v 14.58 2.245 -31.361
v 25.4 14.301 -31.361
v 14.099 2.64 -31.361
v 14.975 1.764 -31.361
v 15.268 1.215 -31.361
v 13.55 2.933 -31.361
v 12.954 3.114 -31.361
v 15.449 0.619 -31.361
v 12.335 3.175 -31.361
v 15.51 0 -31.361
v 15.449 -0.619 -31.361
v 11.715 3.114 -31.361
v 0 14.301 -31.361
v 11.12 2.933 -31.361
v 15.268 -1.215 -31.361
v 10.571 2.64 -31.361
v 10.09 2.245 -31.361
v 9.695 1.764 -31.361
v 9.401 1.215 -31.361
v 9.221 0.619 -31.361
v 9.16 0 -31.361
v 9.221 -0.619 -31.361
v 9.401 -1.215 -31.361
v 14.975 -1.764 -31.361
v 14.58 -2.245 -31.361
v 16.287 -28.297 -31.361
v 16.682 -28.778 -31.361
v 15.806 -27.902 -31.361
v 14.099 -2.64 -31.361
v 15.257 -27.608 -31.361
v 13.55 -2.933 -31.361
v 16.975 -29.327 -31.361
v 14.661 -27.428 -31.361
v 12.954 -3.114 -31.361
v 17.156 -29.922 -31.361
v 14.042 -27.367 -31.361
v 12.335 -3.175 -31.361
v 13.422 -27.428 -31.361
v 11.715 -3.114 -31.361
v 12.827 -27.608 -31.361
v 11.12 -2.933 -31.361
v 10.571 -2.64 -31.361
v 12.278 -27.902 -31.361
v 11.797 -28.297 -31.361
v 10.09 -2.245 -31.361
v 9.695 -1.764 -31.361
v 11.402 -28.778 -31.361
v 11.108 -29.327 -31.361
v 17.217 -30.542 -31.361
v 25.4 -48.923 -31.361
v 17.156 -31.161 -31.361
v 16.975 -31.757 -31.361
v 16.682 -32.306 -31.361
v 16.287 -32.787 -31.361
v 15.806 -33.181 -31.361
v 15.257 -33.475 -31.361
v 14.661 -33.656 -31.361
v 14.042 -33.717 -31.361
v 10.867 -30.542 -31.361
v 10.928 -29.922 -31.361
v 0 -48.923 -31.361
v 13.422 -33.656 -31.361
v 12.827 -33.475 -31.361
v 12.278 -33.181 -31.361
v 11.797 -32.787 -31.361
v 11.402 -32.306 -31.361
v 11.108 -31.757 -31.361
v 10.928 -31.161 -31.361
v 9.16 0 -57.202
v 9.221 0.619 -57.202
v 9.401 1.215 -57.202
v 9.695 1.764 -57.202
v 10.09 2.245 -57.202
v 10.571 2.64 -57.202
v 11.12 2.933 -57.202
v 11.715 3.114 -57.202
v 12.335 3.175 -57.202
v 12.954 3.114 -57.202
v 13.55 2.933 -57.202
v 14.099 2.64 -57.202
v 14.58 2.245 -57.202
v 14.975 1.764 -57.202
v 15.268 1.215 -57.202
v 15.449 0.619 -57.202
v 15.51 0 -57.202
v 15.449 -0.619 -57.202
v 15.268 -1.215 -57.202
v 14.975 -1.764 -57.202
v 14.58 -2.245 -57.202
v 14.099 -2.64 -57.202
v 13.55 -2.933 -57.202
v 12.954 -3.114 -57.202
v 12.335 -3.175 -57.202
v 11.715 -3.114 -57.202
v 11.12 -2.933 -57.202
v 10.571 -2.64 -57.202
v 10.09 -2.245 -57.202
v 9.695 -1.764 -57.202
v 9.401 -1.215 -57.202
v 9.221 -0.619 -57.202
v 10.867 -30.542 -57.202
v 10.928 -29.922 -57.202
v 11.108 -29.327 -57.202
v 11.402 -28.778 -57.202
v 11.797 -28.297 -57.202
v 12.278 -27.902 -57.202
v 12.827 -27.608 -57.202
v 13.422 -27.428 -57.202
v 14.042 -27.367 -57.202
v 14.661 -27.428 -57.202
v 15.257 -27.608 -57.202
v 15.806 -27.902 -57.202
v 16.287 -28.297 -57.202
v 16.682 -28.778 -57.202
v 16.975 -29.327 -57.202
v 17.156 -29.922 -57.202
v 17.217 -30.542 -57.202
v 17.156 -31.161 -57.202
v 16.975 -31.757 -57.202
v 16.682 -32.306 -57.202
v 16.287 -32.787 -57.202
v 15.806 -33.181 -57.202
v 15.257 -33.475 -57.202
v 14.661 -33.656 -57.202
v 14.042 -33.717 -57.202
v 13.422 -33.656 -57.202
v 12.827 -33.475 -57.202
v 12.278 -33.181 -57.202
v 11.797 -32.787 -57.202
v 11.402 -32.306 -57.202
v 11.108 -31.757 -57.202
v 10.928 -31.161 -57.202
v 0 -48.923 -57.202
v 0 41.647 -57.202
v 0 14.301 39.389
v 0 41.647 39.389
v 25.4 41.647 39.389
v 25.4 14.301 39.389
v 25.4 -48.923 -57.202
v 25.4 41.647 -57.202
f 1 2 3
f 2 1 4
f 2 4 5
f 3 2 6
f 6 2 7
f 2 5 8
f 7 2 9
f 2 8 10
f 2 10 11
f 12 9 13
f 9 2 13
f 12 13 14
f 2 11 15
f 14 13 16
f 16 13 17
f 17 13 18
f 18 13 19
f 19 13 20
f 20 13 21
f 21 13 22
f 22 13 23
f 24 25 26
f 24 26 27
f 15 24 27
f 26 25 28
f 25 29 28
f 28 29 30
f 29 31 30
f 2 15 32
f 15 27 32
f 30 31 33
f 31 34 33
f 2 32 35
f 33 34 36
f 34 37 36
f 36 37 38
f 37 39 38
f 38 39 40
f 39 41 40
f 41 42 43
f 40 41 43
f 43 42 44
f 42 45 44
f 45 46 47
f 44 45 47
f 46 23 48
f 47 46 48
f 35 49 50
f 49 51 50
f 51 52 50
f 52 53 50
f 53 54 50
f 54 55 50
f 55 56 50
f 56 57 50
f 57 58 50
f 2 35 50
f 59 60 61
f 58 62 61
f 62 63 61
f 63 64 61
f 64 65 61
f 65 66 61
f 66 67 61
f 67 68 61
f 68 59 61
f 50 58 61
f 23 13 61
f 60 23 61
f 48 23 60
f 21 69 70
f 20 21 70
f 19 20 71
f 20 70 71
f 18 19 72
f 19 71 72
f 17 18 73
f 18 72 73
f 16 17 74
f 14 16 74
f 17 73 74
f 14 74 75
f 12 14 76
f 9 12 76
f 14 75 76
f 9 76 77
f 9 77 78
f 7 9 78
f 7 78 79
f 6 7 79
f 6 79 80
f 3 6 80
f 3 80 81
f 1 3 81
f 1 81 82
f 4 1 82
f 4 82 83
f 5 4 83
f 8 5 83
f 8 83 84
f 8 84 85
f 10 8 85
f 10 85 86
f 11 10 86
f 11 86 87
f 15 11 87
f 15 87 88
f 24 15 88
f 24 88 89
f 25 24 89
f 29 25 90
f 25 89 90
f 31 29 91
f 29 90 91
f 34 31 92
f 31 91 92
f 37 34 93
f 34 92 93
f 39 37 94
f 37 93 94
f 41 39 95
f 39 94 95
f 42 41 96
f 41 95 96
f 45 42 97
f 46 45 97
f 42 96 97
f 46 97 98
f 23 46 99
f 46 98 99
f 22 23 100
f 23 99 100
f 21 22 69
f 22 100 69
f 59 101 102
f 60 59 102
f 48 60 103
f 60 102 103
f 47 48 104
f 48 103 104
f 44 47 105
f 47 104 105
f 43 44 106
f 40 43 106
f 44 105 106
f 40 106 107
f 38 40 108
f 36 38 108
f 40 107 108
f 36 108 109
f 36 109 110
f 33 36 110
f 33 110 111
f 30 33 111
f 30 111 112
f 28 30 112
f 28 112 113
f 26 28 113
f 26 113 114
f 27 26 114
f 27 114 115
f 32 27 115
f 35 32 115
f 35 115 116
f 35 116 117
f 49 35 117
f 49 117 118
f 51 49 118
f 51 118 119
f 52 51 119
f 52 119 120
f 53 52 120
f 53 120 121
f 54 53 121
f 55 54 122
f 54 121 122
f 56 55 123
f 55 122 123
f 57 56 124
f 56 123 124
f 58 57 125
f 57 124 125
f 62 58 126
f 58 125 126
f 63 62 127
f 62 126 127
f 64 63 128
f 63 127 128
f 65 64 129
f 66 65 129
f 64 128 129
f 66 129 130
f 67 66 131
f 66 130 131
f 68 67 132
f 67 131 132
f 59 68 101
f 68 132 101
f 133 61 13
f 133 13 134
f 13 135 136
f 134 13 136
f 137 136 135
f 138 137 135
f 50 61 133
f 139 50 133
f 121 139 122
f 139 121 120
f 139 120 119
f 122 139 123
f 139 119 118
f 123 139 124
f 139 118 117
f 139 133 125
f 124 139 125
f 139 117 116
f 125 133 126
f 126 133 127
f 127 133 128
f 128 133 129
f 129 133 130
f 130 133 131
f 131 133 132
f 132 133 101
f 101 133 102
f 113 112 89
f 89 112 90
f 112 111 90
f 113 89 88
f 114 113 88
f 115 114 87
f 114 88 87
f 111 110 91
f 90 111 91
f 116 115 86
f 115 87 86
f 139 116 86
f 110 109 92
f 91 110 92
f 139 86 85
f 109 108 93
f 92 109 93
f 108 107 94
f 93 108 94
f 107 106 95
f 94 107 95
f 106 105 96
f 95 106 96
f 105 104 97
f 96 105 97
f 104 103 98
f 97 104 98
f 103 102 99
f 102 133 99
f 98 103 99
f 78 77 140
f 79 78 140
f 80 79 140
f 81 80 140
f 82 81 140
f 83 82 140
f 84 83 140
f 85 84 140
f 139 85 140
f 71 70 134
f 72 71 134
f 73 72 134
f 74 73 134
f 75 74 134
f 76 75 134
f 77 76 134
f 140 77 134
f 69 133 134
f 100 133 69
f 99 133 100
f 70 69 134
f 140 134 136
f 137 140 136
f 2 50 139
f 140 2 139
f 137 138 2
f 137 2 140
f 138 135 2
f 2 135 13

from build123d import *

# Parameters (mm, degrees)
F1_DEPTH = 25.4
F3_D     = 6.35
F5_D     = 6.35


# Not quite as in the source:
# - a feature names something its author has since deleted; it is built from what else it names


with BuildPart() as f1:
    # F0 (on Right) → F1 (new body)
    with BuildSketch(Plane.YZ):
        Polygon((14.3006006256, -31.3609689474), (-48.9231087267, -31.3609689474), (-48.9231087267, -57.2024062276), (41.6473634541, -57.2024062276), (41.6473634541, 39.3893681467), (14.3006006256, 39.3893681467), align=None)
    extrude(amount=F1_DEPTH)

    # F3 (through all)
    with Locations(Plane.XY.offset(-31.3609689474)):
        with Locations((14.0417637303, -30.5415708572)):
            Hole(F3_D / 2)

    # F5 (through all)
    with Locations(Plane.XY.offset(-31.3609689474)):
        with Locations((12.3347630724, 0)):
            Hole(F5_D / 2)


solid = f1.part
